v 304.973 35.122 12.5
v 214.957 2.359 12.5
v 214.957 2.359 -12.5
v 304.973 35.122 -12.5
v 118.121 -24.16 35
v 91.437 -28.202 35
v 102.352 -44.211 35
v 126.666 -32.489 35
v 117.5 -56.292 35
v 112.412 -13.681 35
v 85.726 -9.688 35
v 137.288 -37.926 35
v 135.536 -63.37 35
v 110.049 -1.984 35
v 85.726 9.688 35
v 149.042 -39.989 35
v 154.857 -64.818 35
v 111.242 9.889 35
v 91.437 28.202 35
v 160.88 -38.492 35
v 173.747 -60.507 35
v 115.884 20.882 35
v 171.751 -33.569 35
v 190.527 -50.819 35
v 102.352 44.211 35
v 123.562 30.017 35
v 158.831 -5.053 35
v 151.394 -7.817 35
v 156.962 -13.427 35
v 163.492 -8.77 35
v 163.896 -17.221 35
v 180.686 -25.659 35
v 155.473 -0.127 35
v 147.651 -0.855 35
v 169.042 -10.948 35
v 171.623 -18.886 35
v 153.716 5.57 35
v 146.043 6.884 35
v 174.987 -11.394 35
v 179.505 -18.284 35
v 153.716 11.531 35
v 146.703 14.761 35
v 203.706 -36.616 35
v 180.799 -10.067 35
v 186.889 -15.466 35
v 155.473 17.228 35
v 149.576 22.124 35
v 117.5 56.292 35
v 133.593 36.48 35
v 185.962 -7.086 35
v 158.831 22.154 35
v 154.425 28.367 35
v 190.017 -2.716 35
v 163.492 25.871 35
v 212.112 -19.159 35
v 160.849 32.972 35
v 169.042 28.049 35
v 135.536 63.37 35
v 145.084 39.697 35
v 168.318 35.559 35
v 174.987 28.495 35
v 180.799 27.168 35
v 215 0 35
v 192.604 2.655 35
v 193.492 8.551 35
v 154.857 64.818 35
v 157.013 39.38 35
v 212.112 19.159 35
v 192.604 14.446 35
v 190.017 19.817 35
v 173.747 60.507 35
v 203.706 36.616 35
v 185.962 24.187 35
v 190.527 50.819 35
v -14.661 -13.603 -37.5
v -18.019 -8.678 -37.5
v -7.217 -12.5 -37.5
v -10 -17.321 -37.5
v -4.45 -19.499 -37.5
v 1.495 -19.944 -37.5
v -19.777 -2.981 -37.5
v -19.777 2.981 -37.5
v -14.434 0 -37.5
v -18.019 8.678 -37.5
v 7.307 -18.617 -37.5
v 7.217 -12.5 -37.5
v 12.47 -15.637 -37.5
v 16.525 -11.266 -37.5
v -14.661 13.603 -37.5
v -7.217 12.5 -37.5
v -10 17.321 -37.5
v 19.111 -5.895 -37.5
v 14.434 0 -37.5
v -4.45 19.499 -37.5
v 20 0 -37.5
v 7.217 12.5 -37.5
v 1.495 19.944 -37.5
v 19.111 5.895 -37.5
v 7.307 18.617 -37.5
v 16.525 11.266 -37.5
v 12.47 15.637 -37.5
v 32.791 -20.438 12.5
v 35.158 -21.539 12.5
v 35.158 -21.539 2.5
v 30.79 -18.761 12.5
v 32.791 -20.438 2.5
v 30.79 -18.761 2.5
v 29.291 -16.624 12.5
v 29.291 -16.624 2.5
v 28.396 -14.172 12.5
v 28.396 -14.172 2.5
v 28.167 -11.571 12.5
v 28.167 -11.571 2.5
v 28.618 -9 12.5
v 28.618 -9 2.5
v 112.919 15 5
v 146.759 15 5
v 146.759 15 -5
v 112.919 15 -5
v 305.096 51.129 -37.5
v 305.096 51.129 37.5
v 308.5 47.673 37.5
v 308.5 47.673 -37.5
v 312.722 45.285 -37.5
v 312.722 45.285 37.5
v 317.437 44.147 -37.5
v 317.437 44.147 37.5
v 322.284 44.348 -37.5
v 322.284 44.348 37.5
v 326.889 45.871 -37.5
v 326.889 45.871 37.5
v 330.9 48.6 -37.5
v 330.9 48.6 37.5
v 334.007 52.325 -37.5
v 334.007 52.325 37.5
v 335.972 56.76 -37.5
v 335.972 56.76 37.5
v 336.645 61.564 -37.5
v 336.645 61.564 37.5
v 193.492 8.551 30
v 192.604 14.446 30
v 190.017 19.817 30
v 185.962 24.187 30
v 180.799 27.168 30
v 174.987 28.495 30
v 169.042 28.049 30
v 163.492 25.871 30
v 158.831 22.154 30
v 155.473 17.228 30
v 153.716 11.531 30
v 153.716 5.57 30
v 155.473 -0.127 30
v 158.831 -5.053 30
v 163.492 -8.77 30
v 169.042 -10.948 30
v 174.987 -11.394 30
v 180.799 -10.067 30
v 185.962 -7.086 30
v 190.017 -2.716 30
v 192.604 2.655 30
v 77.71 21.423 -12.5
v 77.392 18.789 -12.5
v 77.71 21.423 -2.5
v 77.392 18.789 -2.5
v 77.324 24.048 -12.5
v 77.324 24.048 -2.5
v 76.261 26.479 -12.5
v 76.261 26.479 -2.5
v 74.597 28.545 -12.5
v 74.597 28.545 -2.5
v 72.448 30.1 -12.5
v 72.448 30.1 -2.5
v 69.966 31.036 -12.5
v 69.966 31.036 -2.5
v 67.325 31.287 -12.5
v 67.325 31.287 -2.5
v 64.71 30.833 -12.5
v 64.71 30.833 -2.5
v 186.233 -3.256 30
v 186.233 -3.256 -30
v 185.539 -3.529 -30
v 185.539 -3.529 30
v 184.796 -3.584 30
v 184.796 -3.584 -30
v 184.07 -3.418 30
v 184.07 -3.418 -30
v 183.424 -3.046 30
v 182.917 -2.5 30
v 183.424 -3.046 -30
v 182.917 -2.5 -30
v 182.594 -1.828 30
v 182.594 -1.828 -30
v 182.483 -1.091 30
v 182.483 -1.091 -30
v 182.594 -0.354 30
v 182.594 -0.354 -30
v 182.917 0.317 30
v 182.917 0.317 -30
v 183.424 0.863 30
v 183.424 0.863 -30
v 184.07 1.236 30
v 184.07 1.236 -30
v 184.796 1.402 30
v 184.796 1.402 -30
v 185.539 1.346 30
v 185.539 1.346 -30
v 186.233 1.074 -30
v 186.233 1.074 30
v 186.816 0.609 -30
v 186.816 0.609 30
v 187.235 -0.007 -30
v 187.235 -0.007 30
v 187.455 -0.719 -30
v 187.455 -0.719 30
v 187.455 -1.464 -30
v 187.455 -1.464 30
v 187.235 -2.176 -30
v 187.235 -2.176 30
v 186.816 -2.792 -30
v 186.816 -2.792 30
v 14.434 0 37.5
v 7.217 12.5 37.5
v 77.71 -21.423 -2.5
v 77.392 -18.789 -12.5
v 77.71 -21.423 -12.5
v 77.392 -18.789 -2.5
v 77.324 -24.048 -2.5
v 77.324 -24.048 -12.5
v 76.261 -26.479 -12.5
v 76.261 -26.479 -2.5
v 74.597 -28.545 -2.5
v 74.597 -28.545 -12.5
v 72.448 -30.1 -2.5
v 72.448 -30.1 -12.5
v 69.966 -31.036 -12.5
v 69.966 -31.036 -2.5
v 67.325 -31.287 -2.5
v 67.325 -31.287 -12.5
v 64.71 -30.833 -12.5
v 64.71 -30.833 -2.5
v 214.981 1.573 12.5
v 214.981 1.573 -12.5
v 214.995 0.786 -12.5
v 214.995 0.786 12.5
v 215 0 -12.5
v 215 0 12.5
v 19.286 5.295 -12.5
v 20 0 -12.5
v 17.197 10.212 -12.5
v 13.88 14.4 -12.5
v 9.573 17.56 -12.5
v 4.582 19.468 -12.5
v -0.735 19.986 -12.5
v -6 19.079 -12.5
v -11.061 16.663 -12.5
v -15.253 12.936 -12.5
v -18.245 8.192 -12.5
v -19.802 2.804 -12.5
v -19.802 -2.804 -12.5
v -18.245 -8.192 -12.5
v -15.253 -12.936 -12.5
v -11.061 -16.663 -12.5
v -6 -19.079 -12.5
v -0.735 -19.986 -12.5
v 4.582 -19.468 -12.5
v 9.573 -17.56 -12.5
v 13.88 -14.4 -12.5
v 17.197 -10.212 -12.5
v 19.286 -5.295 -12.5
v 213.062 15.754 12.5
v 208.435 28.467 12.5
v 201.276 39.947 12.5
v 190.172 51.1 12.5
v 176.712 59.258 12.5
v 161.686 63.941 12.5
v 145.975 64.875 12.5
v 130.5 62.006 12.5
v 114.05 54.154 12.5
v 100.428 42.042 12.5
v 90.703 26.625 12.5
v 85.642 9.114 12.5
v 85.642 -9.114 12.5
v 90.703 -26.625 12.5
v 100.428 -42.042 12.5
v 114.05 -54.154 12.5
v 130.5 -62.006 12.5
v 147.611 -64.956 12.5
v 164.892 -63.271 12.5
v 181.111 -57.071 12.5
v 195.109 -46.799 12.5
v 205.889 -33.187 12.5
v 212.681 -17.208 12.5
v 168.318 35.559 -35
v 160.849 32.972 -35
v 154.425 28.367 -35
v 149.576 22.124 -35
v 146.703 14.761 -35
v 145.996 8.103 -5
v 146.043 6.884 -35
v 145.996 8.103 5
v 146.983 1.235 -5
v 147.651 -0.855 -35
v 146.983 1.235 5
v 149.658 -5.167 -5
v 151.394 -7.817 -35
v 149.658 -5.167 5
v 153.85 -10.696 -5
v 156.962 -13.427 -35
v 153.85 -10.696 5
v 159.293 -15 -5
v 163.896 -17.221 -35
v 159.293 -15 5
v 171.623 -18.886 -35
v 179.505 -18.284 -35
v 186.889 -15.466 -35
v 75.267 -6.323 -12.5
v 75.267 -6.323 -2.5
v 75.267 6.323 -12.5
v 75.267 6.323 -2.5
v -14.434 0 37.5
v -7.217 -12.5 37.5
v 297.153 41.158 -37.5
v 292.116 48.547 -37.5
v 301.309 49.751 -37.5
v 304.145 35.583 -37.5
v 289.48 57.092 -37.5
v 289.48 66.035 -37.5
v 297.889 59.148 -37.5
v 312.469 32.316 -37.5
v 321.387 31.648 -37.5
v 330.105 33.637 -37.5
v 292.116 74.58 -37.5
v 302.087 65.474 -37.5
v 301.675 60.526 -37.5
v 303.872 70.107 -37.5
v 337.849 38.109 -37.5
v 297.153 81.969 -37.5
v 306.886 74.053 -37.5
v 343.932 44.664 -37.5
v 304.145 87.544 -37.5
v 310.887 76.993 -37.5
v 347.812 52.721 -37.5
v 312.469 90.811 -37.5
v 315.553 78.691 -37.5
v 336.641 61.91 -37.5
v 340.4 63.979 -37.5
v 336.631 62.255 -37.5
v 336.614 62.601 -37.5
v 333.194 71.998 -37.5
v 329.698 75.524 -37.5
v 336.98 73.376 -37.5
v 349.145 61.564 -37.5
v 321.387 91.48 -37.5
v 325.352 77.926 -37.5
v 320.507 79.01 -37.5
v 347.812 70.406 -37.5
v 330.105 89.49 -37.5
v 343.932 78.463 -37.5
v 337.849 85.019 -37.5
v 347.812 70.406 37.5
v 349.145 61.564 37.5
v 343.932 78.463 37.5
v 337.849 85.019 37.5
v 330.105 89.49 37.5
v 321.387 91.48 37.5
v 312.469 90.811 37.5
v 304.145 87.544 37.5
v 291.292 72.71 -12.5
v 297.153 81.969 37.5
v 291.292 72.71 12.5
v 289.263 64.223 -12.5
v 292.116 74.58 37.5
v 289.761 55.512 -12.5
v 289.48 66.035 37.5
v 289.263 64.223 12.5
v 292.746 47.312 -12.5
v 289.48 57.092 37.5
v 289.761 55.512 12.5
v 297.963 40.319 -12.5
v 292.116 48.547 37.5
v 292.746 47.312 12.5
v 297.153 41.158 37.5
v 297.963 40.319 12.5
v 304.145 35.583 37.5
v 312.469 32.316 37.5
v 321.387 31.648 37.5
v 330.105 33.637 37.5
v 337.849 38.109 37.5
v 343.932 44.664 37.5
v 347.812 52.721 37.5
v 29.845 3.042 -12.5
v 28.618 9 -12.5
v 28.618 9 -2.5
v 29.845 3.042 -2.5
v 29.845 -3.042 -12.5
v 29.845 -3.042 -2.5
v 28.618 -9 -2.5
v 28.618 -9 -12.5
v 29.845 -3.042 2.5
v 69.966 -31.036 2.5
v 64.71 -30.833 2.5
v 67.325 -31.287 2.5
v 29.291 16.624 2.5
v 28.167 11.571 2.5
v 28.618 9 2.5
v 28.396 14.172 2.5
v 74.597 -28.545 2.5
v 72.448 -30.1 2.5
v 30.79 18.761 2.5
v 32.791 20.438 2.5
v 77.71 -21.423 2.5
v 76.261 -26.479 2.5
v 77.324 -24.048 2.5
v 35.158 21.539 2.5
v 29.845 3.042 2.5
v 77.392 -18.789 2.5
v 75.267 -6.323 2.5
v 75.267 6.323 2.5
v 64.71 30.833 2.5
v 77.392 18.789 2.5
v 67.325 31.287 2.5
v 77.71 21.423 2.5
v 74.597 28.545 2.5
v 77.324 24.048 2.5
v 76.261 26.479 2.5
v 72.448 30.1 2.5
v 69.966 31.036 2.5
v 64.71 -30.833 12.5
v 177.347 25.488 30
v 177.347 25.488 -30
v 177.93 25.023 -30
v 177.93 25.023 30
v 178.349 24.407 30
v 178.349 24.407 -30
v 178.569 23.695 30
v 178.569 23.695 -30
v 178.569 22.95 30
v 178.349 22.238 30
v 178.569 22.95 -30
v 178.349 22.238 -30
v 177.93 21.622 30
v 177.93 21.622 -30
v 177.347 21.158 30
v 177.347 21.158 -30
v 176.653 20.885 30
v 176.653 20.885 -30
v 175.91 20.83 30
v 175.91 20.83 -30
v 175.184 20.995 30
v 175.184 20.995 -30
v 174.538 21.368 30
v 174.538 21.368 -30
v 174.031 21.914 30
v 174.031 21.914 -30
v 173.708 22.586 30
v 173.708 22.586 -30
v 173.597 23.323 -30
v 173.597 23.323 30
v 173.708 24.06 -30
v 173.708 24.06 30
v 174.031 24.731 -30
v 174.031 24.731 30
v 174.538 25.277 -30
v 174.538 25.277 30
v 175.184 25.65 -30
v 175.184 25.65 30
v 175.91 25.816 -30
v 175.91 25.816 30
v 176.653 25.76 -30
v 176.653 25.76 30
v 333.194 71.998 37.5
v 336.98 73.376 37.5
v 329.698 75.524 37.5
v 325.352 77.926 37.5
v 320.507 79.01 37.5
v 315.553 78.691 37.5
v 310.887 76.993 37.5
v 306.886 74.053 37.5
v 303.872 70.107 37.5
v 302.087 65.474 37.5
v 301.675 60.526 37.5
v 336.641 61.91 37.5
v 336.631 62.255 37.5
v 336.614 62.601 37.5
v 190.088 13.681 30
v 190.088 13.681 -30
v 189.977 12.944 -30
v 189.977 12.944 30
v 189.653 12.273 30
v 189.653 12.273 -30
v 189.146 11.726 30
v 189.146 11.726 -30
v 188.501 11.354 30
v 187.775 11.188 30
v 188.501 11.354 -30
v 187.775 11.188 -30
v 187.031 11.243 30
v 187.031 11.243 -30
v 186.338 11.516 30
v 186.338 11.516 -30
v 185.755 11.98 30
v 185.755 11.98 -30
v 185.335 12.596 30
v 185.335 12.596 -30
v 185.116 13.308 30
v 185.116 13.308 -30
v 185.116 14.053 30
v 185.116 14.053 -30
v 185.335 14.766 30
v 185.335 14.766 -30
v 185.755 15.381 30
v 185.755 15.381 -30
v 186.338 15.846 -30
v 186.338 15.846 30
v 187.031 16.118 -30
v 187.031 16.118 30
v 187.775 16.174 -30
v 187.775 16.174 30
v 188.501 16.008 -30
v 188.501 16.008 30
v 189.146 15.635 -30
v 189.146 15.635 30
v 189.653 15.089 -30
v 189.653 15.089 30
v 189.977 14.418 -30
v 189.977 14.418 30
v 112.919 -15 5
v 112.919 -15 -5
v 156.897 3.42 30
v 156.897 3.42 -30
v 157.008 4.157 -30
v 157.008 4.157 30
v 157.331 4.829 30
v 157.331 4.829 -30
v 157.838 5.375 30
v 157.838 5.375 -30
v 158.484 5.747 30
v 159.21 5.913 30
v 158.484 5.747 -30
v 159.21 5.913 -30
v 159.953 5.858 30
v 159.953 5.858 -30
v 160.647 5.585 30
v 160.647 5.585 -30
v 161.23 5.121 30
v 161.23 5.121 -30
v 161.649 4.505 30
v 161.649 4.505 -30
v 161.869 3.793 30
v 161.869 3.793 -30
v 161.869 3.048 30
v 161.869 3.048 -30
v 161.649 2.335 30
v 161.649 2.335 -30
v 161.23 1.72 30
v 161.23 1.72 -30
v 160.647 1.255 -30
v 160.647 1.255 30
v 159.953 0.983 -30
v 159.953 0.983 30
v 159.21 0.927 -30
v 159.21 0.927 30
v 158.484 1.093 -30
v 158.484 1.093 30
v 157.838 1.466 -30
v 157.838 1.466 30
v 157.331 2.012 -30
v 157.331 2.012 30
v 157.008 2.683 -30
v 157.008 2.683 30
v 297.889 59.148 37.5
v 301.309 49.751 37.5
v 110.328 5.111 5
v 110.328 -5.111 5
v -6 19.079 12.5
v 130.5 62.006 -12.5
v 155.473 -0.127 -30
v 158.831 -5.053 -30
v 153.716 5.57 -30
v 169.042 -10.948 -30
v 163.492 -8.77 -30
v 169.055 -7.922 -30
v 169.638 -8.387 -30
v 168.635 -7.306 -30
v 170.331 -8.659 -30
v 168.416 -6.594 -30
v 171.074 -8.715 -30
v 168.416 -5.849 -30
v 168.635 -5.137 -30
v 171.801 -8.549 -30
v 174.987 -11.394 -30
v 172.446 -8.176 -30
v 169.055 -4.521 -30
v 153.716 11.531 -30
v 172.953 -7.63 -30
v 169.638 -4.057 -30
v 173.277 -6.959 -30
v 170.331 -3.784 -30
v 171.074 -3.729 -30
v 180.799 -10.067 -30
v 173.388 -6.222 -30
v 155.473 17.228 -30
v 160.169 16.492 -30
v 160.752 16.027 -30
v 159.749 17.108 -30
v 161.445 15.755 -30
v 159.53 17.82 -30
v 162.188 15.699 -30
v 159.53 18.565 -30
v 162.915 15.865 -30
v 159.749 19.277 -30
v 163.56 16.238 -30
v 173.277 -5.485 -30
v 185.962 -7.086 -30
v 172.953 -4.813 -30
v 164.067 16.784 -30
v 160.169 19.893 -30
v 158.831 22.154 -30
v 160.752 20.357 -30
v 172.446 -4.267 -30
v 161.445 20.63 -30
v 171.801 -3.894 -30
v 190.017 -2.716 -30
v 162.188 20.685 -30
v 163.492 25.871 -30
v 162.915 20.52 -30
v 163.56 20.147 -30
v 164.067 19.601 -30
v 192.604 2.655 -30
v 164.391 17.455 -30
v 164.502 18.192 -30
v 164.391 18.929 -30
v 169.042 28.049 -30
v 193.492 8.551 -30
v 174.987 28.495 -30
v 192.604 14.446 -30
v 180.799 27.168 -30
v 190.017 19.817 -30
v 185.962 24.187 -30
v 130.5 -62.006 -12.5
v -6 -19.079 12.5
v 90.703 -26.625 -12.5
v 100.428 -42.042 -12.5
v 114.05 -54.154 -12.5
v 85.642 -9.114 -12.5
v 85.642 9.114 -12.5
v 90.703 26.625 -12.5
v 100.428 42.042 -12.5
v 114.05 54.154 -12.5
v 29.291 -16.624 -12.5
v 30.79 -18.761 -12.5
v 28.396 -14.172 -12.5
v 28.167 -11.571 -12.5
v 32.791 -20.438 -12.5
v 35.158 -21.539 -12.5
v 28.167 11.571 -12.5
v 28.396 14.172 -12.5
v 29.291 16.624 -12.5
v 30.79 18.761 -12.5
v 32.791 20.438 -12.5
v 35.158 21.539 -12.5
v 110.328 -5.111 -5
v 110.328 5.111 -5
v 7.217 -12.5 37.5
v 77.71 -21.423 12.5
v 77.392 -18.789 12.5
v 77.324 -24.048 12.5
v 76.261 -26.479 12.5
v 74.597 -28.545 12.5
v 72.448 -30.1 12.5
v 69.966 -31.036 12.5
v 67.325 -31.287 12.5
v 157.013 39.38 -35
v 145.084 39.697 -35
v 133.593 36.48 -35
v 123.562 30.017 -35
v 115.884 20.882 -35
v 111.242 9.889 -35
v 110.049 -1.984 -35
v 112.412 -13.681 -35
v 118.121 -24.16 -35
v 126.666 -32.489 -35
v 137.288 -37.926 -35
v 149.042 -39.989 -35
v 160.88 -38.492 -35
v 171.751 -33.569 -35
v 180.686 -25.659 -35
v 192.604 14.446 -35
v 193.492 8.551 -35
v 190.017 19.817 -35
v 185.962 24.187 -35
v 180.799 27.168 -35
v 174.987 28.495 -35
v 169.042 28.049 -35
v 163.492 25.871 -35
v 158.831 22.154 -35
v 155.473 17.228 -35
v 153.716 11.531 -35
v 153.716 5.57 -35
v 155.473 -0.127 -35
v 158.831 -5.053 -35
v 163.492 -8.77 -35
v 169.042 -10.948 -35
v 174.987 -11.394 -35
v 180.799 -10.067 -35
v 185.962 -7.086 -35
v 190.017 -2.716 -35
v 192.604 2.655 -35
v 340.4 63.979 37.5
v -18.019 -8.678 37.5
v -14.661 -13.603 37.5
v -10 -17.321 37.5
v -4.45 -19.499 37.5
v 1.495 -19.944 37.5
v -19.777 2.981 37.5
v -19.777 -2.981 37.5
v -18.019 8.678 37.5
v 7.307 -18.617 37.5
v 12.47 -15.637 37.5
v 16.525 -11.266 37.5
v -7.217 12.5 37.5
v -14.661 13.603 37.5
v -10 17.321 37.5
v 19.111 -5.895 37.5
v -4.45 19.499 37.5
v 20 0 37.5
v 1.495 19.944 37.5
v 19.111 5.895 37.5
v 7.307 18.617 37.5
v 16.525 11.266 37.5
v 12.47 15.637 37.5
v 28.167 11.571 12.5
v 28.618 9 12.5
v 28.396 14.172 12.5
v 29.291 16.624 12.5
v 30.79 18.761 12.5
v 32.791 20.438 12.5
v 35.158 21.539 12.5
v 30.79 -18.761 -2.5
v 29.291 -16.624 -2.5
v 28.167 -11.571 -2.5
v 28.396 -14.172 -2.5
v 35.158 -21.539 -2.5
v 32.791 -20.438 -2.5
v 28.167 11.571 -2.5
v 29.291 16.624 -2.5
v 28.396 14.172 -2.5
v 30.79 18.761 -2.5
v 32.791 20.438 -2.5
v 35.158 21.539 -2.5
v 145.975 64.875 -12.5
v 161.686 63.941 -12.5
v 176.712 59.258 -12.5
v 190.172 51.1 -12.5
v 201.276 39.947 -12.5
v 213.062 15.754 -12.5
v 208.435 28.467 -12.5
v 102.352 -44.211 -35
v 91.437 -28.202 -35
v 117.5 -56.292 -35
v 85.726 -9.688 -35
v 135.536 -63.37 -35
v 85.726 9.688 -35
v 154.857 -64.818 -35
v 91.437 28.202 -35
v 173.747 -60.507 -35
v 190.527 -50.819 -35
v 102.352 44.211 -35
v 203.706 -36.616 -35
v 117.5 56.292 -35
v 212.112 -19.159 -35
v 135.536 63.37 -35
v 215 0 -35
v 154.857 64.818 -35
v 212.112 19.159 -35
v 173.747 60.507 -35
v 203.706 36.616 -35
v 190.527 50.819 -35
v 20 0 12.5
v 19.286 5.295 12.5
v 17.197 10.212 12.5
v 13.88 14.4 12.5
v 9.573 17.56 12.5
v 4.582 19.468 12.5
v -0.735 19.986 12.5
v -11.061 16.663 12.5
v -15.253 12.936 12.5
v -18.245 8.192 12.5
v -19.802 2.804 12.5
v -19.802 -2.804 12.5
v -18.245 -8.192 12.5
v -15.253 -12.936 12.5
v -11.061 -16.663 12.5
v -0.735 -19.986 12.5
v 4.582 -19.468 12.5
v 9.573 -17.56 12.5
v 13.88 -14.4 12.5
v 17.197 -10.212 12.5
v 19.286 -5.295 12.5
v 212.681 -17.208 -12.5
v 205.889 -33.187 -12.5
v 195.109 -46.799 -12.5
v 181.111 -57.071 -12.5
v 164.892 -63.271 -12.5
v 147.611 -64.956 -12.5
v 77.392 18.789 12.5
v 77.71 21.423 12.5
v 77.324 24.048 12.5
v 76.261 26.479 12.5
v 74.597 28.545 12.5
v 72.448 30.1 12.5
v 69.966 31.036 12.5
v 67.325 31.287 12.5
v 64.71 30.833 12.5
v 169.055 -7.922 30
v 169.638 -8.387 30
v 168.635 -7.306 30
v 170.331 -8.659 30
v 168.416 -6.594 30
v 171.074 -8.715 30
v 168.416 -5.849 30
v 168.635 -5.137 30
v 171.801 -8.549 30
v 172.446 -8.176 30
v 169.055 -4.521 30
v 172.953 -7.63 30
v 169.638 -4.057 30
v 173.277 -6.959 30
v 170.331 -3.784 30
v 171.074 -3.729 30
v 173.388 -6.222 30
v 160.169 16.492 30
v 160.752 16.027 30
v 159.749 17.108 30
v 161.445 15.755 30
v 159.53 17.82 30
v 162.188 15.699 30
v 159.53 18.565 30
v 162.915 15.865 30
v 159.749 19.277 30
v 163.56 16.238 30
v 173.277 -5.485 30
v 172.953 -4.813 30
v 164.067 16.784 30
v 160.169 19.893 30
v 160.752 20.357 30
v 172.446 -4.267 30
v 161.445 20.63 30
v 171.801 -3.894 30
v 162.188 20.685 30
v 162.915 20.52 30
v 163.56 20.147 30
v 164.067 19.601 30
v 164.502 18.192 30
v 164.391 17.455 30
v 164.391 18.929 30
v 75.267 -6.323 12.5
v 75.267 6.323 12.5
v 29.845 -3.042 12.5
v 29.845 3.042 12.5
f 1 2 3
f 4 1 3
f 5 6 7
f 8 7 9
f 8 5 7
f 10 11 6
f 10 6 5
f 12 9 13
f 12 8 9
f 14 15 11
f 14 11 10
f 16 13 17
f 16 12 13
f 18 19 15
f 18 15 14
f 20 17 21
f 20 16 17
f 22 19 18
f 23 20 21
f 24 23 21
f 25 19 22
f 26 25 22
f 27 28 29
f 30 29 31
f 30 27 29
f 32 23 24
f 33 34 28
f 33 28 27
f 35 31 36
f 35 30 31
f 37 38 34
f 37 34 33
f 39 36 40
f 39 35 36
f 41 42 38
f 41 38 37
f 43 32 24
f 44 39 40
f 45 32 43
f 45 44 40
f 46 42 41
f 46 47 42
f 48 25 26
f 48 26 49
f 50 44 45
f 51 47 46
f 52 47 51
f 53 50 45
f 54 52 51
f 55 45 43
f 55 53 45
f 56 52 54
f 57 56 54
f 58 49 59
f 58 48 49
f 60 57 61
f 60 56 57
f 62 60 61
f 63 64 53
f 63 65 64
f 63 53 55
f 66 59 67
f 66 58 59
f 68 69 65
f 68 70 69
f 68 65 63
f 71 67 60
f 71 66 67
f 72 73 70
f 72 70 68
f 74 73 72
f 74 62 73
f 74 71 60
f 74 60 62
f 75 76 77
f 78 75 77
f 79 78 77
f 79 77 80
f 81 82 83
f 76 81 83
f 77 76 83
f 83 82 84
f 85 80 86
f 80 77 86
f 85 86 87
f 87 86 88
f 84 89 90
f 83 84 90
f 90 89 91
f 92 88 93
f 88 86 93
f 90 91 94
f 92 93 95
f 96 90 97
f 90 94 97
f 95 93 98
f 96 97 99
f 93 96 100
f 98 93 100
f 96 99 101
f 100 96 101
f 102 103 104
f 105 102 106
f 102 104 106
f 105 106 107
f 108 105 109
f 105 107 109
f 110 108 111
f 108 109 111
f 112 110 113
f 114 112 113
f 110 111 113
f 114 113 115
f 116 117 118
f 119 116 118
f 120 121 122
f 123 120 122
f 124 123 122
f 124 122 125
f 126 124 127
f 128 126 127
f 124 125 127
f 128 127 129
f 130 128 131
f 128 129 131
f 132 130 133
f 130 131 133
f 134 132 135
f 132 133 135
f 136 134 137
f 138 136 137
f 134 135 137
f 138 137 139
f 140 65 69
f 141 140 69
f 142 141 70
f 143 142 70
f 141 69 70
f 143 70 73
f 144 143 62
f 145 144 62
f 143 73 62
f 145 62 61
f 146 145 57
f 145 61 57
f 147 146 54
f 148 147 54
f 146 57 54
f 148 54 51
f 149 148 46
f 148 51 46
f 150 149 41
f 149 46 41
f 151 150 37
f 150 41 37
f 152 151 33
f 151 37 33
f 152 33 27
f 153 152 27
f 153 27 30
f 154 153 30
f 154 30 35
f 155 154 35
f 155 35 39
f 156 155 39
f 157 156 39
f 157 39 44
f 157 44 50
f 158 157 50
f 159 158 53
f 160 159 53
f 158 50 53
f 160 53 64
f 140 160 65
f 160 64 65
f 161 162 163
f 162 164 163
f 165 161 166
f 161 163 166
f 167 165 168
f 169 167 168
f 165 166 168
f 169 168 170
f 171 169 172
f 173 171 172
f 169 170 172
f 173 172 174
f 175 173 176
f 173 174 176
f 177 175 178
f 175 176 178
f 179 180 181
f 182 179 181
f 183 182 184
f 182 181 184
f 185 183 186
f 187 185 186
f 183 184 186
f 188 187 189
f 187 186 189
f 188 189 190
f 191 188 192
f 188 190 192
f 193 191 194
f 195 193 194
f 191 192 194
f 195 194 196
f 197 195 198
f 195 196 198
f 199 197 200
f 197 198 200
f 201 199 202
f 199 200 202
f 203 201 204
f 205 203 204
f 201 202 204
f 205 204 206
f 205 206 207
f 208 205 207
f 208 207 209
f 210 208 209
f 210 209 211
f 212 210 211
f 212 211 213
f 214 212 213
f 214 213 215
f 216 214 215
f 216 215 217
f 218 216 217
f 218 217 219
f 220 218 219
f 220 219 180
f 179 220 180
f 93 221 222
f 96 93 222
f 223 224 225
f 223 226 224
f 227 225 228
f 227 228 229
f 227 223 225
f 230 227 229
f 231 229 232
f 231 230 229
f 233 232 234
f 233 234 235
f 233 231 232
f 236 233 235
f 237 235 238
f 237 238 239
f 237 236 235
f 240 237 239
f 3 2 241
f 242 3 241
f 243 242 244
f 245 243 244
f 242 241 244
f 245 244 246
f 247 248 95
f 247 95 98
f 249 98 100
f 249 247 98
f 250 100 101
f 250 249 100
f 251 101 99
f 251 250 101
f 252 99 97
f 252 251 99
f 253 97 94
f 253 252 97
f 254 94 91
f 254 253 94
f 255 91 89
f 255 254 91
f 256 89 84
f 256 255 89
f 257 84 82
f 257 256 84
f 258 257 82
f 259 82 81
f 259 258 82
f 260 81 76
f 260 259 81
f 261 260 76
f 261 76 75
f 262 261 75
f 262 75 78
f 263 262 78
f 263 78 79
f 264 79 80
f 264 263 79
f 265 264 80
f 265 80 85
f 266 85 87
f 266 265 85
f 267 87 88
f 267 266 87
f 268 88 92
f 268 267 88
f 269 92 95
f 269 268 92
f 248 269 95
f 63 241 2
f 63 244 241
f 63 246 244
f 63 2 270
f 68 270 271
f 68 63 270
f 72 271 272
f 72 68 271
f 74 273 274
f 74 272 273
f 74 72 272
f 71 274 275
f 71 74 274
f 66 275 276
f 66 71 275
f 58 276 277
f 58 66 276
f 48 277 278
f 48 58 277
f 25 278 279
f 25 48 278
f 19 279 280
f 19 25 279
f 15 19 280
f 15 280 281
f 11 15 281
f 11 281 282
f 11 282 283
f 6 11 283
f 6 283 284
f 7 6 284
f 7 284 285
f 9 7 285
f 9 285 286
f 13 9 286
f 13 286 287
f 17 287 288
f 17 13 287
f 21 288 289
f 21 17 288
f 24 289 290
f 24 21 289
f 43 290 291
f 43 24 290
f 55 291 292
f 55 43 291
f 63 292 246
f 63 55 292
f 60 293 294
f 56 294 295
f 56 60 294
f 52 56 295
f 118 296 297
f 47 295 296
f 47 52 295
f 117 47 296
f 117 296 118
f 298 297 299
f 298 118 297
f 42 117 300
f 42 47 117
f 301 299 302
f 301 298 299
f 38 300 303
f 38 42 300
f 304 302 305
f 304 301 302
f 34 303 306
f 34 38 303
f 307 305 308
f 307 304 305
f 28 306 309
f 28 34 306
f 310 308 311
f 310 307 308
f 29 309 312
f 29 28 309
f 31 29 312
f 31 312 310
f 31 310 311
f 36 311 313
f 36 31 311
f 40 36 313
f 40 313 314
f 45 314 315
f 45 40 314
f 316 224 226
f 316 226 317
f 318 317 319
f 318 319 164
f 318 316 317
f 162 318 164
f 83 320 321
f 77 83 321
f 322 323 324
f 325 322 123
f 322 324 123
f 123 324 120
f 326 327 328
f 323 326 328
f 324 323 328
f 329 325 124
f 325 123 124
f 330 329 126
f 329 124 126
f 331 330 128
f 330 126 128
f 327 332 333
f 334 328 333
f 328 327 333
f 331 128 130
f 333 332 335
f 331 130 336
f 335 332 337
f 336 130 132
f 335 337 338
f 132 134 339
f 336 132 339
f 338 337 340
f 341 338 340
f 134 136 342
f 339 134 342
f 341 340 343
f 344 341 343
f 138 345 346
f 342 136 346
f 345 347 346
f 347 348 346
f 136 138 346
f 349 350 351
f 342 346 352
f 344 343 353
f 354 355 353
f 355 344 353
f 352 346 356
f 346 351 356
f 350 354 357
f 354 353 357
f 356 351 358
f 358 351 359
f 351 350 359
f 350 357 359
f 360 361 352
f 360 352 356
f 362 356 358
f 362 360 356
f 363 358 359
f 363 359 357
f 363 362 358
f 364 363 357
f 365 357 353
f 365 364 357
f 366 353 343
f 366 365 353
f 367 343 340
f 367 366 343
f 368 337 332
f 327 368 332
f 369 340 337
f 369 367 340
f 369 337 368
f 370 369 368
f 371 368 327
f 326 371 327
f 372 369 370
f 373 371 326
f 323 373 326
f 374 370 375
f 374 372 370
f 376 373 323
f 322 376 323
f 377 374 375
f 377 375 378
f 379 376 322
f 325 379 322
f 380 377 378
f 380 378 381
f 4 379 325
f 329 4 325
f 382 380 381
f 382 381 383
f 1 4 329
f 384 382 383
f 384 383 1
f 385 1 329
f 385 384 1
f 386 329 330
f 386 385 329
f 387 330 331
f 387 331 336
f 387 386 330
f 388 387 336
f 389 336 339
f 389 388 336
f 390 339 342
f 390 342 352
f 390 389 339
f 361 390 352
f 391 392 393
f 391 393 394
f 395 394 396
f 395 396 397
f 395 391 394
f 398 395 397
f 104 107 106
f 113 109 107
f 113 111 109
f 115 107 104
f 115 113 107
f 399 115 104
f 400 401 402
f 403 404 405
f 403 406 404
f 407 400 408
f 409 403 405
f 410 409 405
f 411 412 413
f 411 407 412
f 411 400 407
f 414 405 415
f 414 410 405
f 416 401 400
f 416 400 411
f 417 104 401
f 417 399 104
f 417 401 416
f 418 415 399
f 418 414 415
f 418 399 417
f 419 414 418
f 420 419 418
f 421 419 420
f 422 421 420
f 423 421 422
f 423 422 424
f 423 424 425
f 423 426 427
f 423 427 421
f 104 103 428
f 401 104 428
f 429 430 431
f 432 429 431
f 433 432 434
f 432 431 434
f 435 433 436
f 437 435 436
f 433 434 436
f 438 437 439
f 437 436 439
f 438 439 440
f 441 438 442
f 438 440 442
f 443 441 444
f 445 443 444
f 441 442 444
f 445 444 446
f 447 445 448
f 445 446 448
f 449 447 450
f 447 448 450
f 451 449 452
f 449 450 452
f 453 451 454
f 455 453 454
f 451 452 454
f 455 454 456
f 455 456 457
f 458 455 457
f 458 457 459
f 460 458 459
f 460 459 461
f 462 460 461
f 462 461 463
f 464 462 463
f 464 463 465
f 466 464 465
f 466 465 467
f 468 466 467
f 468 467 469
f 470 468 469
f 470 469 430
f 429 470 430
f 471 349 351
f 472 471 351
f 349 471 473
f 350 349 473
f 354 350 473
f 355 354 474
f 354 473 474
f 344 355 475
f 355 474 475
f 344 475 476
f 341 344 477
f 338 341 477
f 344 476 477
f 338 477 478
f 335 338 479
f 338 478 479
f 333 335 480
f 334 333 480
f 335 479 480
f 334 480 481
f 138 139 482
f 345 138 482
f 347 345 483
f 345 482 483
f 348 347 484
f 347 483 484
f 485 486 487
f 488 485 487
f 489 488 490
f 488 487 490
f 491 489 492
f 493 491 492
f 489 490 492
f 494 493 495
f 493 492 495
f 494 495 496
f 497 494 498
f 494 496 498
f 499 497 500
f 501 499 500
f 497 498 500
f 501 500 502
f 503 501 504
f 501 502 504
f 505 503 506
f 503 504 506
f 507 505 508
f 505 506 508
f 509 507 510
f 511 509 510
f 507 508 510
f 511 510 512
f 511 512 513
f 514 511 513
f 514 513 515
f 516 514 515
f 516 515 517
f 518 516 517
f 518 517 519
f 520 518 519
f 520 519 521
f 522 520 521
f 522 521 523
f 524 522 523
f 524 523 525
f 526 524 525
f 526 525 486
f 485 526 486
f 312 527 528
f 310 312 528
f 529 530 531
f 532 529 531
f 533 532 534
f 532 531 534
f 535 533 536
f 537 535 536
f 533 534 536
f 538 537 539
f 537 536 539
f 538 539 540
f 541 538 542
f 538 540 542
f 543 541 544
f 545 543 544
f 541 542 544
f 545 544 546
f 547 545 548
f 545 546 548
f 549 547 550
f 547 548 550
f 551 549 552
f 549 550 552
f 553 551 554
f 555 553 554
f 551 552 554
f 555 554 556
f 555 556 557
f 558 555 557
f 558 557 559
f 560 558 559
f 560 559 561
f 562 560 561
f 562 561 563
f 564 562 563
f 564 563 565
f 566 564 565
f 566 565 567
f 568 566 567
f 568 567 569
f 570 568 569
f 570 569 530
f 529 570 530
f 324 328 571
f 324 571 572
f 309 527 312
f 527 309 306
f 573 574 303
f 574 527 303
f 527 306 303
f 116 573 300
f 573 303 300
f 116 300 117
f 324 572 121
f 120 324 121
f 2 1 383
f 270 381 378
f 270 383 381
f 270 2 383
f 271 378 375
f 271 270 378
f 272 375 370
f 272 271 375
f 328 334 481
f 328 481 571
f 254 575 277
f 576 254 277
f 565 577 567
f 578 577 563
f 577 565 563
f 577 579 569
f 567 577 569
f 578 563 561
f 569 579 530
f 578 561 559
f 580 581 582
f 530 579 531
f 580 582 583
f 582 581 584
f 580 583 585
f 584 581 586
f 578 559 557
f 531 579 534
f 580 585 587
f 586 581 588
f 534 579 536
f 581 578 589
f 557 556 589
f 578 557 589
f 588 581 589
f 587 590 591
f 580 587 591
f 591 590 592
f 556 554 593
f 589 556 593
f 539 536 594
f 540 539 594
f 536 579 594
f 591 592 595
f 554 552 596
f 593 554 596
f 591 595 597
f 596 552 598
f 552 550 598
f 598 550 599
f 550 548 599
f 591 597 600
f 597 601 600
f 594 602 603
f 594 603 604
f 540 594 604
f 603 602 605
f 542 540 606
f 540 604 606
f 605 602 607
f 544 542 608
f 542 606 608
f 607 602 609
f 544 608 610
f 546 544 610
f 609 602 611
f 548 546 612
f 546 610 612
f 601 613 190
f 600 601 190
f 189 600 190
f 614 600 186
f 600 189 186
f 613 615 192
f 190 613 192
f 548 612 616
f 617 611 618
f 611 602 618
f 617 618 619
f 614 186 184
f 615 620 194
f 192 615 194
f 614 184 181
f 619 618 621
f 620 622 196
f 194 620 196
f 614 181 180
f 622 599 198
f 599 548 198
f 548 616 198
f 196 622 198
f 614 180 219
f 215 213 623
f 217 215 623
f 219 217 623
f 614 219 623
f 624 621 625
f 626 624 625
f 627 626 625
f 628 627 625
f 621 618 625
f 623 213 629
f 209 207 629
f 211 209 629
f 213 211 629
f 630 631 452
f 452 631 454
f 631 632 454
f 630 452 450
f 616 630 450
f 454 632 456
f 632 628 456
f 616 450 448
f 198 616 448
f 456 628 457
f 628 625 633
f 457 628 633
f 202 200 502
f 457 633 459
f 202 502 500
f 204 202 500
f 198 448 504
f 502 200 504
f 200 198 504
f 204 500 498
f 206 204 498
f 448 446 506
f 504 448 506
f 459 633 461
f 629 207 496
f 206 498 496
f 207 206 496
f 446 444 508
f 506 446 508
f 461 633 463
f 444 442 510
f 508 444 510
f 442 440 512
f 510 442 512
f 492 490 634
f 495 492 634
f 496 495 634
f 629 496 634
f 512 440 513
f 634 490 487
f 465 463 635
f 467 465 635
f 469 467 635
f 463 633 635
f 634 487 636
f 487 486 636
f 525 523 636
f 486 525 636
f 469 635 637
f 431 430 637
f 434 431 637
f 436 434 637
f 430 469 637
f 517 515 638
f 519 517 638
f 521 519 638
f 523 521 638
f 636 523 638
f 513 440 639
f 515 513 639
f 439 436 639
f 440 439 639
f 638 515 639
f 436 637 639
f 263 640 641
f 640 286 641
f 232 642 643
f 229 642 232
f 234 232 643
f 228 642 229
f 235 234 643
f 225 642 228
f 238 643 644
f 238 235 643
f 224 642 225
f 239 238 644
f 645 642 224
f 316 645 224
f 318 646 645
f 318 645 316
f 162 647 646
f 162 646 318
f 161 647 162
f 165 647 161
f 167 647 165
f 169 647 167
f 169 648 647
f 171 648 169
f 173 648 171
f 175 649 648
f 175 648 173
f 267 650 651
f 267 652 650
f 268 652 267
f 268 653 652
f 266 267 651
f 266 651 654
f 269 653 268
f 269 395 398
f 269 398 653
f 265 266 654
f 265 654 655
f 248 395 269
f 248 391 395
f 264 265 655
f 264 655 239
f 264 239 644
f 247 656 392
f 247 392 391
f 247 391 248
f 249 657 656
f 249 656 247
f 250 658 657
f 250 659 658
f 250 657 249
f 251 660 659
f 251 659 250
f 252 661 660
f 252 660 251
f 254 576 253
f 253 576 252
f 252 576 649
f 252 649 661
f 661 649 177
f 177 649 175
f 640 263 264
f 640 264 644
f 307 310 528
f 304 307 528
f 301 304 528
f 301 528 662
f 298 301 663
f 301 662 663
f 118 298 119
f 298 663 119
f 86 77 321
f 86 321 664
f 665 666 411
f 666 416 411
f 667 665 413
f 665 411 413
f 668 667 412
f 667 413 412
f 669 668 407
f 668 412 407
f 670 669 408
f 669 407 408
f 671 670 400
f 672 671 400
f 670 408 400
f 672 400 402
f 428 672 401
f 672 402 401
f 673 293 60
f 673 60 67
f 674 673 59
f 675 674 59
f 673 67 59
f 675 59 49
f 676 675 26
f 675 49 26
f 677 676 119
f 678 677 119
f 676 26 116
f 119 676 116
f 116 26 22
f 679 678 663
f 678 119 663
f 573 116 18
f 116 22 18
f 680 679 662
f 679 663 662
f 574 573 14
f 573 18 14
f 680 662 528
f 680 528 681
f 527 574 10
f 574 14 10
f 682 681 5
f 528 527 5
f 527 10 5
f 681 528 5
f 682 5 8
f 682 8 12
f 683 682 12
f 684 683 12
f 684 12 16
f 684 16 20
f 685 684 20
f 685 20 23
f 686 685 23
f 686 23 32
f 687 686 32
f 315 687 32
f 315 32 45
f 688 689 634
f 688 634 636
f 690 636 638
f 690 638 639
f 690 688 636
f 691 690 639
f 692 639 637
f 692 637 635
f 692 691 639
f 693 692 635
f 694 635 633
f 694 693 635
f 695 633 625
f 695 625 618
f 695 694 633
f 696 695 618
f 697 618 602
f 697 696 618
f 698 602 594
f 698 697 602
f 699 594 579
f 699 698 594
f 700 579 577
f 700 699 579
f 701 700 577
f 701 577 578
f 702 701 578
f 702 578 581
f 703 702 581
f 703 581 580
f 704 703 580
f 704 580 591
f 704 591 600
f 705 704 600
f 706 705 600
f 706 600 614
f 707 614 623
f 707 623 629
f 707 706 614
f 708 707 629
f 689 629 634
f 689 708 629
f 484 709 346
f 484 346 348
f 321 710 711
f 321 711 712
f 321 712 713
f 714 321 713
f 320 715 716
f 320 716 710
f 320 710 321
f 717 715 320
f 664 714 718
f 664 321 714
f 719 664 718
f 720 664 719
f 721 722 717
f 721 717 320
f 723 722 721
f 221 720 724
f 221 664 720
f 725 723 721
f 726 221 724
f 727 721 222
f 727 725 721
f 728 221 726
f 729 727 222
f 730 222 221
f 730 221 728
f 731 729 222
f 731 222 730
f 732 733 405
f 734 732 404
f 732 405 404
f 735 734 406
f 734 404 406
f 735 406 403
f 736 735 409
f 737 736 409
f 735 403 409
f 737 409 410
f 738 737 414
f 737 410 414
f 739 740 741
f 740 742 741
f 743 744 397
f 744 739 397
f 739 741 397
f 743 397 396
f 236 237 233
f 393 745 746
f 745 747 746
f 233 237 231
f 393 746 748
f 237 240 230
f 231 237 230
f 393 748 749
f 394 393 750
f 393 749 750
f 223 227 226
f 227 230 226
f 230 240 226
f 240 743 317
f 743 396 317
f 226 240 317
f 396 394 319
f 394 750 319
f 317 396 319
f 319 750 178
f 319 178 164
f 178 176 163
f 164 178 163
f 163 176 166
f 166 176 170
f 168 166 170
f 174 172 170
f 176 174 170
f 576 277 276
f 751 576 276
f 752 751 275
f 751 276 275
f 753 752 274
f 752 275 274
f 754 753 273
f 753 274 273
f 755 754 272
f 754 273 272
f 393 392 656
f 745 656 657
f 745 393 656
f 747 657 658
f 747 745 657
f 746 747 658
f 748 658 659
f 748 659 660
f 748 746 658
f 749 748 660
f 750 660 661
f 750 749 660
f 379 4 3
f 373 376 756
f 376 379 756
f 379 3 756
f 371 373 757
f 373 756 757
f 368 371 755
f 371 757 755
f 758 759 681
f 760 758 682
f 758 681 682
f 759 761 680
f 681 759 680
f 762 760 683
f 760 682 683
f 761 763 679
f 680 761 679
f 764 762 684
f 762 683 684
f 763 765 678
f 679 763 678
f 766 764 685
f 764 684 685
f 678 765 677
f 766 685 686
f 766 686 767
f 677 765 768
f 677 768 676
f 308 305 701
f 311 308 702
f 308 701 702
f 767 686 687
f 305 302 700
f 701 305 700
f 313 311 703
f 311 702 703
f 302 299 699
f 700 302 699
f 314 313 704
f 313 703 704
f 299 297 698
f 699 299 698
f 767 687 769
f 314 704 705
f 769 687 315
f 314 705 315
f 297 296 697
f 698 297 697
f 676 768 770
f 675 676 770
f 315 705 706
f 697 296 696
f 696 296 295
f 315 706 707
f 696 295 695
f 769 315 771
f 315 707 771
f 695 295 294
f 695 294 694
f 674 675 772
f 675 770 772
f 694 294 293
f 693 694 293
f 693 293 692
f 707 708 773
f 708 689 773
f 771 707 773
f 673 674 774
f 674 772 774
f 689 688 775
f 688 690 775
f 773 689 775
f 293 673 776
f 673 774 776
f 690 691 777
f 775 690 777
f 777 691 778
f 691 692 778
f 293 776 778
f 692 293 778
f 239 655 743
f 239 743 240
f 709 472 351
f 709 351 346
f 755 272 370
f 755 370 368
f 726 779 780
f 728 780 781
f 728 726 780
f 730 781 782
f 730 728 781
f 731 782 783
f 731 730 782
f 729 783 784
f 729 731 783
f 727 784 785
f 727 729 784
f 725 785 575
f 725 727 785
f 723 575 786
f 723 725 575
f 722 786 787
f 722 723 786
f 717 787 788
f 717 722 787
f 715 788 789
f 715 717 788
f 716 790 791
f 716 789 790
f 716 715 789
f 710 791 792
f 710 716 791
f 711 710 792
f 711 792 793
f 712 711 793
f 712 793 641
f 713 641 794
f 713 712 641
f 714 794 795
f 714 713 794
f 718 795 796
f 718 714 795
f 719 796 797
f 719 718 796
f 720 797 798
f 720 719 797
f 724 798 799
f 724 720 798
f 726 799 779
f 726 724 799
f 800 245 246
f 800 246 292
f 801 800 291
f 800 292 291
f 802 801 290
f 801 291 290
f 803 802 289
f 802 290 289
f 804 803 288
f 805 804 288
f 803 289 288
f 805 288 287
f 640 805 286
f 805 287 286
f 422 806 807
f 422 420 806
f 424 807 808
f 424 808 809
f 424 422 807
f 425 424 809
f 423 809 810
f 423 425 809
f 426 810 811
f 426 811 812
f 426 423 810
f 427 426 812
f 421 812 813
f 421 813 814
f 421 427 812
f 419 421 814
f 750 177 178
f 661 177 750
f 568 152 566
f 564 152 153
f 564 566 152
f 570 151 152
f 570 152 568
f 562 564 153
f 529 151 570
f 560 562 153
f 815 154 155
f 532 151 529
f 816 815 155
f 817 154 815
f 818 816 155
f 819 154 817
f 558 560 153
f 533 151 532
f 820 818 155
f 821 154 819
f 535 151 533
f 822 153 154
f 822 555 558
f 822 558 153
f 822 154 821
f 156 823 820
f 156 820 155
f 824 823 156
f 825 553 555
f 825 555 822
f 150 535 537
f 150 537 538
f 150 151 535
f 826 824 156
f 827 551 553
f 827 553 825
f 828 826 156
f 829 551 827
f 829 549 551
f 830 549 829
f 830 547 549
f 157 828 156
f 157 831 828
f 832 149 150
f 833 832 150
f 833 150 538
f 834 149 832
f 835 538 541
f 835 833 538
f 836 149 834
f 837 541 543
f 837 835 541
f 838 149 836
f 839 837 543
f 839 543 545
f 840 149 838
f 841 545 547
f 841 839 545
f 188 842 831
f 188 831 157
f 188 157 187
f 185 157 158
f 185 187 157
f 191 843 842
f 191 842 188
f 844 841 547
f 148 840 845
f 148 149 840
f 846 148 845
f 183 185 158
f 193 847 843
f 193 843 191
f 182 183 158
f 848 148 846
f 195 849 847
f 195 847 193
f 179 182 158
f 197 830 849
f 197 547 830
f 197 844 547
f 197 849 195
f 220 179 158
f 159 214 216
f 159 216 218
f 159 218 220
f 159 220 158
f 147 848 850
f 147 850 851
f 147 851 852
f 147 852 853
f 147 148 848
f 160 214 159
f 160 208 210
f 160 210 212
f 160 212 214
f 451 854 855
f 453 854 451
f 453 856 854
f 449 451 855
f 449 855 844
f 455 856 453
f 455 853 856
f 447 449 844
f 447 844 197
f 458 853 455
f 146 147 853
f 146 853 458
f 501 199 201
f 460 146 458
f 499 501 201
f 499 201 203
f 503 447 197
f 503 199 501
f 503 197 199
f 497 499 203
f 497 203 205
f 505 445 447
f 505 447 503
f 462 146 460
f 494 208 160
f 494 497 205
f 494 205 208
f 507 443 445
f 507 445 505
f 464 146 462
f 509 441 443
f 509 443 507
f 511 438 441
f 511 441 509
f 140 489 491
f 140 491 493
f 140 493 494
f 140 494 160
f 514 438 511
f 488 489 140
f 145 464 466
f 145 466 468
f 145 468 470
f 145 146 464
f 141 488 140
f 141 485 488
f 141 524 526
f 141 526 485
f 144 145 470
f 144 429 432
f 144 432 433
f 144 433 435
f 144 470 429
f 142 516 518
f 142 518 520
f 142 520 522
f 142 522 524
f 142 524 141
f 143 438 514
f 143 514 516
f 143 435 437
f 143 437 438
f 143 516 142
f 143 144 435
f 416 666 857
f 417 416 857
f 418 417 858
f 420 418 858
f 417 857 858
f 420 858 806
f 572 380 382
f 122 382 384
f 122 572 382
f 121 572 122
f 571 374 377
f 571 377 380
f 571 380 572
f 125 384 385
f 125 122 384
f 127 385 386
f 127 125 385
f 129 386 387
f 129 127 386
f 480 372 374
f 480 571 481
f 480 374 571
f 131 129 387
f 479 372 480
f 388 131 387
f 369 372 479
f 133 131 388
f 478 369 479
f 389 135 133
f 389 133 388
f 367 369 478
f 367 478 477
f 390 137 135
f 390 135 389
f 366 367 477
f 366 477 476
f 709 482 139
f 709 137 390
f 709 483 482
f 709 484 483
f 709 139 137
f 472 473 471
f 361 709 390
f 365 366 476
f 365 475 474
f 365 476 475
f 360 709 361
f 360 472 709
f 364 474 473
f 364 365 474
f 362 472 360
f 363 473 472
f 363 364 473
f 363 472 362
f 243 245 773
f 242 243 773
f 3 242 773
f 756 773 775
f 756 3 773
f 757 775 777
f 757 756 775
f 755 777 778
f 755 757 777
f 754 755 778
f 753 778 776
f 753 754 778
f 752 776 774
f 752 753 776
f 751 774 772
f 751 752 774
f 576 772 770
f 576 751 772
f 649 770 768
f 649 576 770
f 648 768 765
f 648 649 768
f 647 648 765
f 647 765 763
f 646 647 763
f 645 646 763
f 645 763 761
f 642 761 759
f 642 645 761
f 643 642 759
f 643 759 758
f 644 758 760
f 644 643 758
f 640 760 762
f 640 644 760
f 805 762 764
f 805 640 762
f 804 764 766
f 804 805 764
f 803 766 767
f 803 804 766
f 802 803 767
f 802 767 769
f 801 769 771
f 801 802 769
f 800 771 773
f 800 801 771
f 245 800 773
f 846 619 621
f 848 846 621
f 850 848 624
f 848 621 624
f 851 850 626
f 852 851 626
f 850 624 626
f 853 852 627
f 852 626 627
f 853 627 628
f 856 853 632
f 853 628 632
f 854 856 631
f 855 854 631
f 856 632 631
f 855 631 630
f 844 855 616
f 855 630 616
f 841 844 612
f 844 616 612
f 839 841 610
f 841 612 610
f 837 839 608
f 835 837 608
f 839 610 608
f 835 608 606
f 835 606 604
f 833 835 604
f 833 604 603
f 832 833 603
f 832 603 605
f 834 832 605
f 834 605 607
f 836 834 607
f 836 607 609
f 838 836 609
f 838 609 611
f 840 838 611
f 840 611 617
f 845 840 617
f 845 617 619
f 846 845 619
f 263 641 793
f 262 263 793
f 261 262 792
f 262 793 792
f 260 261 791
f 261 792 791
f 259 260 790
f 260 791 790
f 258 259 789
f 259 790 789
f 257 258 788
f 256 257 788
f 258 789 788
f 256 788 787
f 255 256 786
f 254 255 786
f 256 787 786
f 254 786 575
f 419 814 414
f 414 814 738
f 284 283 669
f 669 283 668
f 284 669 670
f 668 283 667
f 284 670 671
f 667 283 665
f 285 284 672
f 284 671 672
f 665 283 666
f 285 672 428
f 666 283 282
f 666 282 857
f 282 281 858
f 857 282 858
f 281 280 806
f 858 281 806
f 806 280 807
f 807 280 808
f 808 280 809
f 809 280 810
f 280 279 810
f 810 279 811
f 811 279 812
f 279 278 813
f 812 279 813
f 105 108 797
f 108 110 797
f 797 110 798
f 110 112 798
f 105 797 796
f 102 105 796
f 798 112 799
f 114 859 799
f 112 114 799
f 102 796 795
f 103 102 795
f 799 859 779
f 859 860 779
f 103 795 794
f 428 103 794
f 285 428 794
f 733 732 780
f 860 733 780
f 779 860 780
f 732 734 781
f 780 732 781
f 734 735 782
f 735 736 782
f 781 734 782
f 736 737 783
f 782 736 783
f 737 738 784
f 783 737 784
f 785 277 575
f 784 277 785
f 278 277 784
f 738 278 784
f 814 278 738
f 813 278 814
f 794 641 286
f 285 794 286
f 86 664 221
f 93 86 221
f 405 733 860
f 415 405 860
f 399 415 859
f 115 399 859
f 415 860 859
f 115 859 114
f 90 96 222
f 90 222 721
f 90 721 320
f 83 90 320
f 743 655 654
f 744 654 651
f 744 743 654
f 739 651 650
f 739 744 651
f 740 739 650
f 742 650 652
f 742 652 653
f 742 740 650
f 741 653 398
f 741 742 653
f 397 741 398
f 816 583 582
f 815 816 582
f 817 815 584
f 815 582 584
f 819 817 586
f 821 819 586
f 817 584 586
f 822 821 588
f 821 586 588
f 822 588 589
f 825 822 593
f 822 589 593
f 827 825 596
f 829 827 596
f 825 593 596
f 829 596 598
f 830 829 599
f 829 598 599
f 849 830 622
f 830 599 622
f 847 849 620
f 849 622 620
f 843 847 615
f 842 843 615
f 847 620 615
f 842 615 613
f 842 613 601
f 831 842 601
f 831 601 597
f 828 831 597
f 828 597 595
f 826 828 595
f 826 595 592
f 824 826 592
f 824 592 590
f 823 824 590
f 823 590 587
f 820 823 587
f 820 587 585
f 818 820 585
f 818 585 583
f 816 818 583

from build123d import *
from build123d.topology import SkipClean

# Parameters (mm, degrees)
LEFT_ARM_DEPTH                = 12.5
SKETCH2_R                     = 20
LEFT_BOSS_DEPTH               = 37.5
LEFT_HEX_DEPTH                = 237.801604724
LEFT_HEX_DEPTH_BACK           = 237.801604724
SKETCH3_R                     = 65
CENTRE_BOSS_DEPTH             = 35
SKETCH5_W                     = 25
SKETCH5_H                     = 40
RIGHT_ARM_DEPTH               = 180
SKETCH7_R                     = 30
RIGHT_BOSS_DEPTH              = 37.5
SKETCH8_R                     = 17.5
RIGHT_BOSS_HOLE_DEPTH         = 369.660954503
SKETCH9_R                     = 40
CENTRE_HOLE_DEPTH             = 369.160494044
SKETCH10_R                    = 27.5
CENTRE_BLOB_DEPTH             = 35
CENTRE_BEAM_REACH             = 224.371
SKETCH11_W                    = 10
SKETCH11_H                    = 30
CENTRE_BEAM_DIRECTION_2_REACH = 224.371
SKETCH12_R                    = 20
CUT_EXTRUDE4_DEPTH            = 5
M6X1_0_TAPPED_HOLE1_D         = 5
CIRPATTERN1_COUNT             = 6
CUT_OUT_DEPTH                 = 10
FILLET1_R                     = 10
FILLET1_OF_MIRROR2_R          = 10
KEYWAY_DEPTH                  = 363.894129706


with BuildPart() as part:
    # Sketch1 → LEFT_ARM (new, symmetric)
    with BuildSketch(Plane.XY):
        with BuildLine():
            Line((-6, 19.078784028), (130.5, 62.006048092))
            ThreePointArc((130.5, 62.006048092), (215, 0), (130.5, -62.006048092))
            Line((130.5, -62.006048092), (-6, -19.078784028))
            ThreePointArc((-6, -19.078784028), (-20, 0), (-6, 19.078784028))
        make_face()
    extrude(amount=LEFT_ARM_DEPTH, both=True)

    # Sketch2 → LEFT_Boss (add, symmetric)
    with SkipClean():  # the faces are left unmerged after this step: merging them gives an invalid solid
        with BuildSketch(Plane.XY):
            Circle(SKETCH2_R)
        extrude(amount=LEFT_BOSS_DEPTH, both=True)

    # Sketch4 → LEFT_Hex (cut, two sides: drawn at the far end of the back side and taken through both)
    with SkipClean():  # the faces are left unmerged after this step: merging them gives an invalid solid
        with BuildSketch(Plane.XY.offset(37.5).offset(-LEFT_HEX_DEPTH_BACK)):
            Polygon((14.43375673, 0), (7.216878365, 12.5), (-7.216878365, 12.5), (-14.43375673, 0), (-7.216878365, -12.5), (7.216878365, -12.5), align=None)
        extrude(amount=LEFT_HEX_DEPTH + LEFT_HEX_DEPTH_BACK, mode=Mode.SUBTRACT)

    # Sketch3 → CENTRE_Boss (add, symmetric)
    with SkipClean():  # the faces are left unmerged after this step: merging them gives an invalid solid
        with BuildSketch(Plane.XY):
            with Locations((150, 0)):
                Circle(SKETCH3_R)
        extrude(amount=CENTRE_BOSS_DEPTH, both=True)

    # Sketch5 → RIGHT_ARM (add)
    with SkipClean():  # the faces are left unmerged after this step: merging them gives an invalid solid
        with BuildSketch(Plane(origin=(132.453333234, 48.209070726, 0), x_dir=(0, 0, -1), z_dir=(0.9396926207859081, 0.34202014332566943, 0))):
            with Locations((0, -51.303021499)):
                Rectangle(SKETCH5_W, SKETCH5_H)
        extrude(amount=RIGHT_ARM_DEPTH)

    # Sketch7 → RIGHT_Boss (add, symmetric)
    with SkipClean():  # the faces are left unmerged after this step: merging them gives an invalid solid
        with BuildSketch(Plane.XY):
            with Locations((319.144671741, 61.563625799)):
                Circle(SKETCH7_R)
        extrude(amount=RIGHT_BOSS_DEPTH, both=True)
    add(part.part.scale(1), mode=Mode.REPLACE)  # the faces are merged on a copy

    # Sketch8 → RIGHT_Boss_Hole (cut, through all)
    with BuildSketch(Plane.XY.offset(37.5)):
        with Locations((319.144671741, 61.563625799)):
            Circle(SKETCH8_R)
    extrude(amount=-RIGHT_BOSS_HOLE_DEPTH, mode=Mode.SUBTRACT)

    # Sketch9 → CENTRE_Hole (cut, through all)
    with BuildSketch(Plane.XY.offset(35)):
        with Locations((150, 0)):
            Circle(SKETCH9_R)
    extrude(amount=-CENTRE_HOLE_DEPTH, mode=Mode.SUBTRACT)

    # Sketch10 → CENTRE_Blob (add, symmetric)
    with SkipClean():  # the faces are left unmerged after this step: merging them gives an invalid solid
        with BuildSketch(Plane.XY):
            with Locations((173.49231552, 8.550503583)):
                Circle(SKETCH10_R)
        extrude(amount=CENTRE_BLOB_DEPTH, both=True)

    # Sketch11 → CENTRE_Beam (add, up to next)
    with BuildSketch(Plane(origin=(150, 0, 0), x_dir=(0, 0, -1), z_dir=(1, 0, 0)), mode=Mode.PRIVATE) as centre_beam_sk1:
        Rectangle(SKETCH11_W, SKETCH11_H)
    centre_beam_tool1 = extrude(centre_beam_sk1.sketch, amount=CENTRE_BEAM_REACH, mode=Mode.PRIVATE) - part.part
    add(centre_beam_tool1.solids().sort_by_distance((150, 0, 0))[0])

    # Sketch11 → CENTRE_Beam direction 2 (add, up to next)
    with BuildSketch(Plane(origin=(150, 0, 0), x_dir=(0, 0, -1), z_dir=(1, 0, 0)), mode=Mode.PRIVATE) as centre_beam_direction_2_sk1:
        Rectangle(SKETCH11_W, SKETCH11_H)
    centre_beam_direction_2_tool1 = extrude(centre_beam_direction_2_sk1.sketch, amount=-CENTRE_BEAM_DIRECTION_2_REACH, mode=Mode.PRIVATE) - part.part
    add(centre_beam_direction_2_tool1.solids().sort_by_distance((150, 0, 0))[0])

    # Sketch12 → Cut-Extrude4 (cut)
    with BuildSketch(Plane.XY.offset(35)):
        with Locations((173.49231552, 8.550503583)):
            Circle(SKETCH12_R)
    cut_extrude4 = extrude(amount=-CUT_EXTRUDE4_DEPTH, mode=Mode.SUBTRACT)

    # M6x1.0 Tapped Hole1 (through all)
    with Locations(Plane.XY.offset(30)):
        with Locations((159.396926208, 3.420201433)):
            m6x1_0_tapped_hole1 = Hole(M6X1_0_TAPPED_HOLE1_D / 2)

    # CirPattern1: M6x1.0 Tapped Hole1 ×6 about axis
    cirpattern1_axis = Axis((173.49231552, 8.550503583, 0), (0, 0, 1))
    for i in range(1, CIRPATTERN1_COUNT):
        add(m6x1_0_tapped_hole1.rotate(cirpattern1_axis, i * 360 / CIRPATTERN1_COUNT), mode=Mode.SUBTRACT)

    # Mirror1: Cut-Extrude4 across plane
    add(cut_extrude4.mirror(Plane.XY), mode=Mode.SUBTRACT)

    # Sketch15 → Cut_OUT (cut)
    with BuildSketch(Plane.XY.offset(12.5)):
        with BuildLine():
            Line((84.858453972, 37.169597537), (23.981475126, 18.024673388))
            ThreePointArc((23.981475126, 18.024673388), (30, 0), (23.981475126, -18.024673388))
            Line((23.981475126, -18.024673388), (84.858453972, -37.169597537))
            ThreePointArc((84.858453972, -37.169597537), (75, 0), (84.858453972, 37.169597537))
        make_face()
    cut_out = extrude(amount=-CUT_OUT_DEPTH, mode=Mode.SUBTRACT)

    # Fillet1
    fillet1_edges = [part.edges().sort_by_distance(p)[0] for p in [
        (23.981475126, -18.024673388, 7.5),
        (23.981475126, 18.024673388, 7.5),
        (84.858453972, 37.169597537, 7.5),
        (84.858453972, -37.169597537, 7.5),
    ]]
    fillet(fillet1_edges, radius=FILLET1_R)

    # Mirror2: Cut_OUT across plane
    with SkipClean():  # the faces are left unmerged after this step: merging them gives an invalid solid
        add(cut_out.mirror(Plane.XY), mode=Mode.SUBTRACT)

    # Fillet1 of Mirror2
    fillet1_of_mirror2_edges = [part.edges().sort_by_distance(p)[0] for p in [
        (23.981475126, -18.024673388, -7.5),
        (23.981475126, 18.024673388, -7.5),
        (84.858453972, 37.169597537, -7.5),
        (84.858453972, -37.169597537, -7.5),
    ]]
    fillet(fillet1_of_mirror2_edges, radius=FILLET1_OF_MIRROR2_R)

    # Sketch16 → KEYWAY (cut, symmetric)
    with SkipClean():  # the faces are left unmerged after this step: merging them gives an invalid solid
        with BuildSketch(Plane.XY):
            Polygon((320.854772458, 56.865162695), (317.434571025, 66.262088903), (297.888964512, 59.148069921), (301.309165946, 49.751143714), align=None)
        keyway = extrude(amount=KEYWAY_DEPTH, both=True, mode=Mode.SUBTRACT)

    # Mirror3: KEYWAY across plane
    with SkipClean():  # the faces are left unmerged after this step: merging them gives an invalid solid
        add(keyway.mirror(Plane(origin=(301.598004975, 109.772696525, 0), x_dir=(0, 0, 1), z_dir=(0.9396926207859081, 0.34202014332566943, 0))), mode=Mode.SUBTRACT)


solid = part.part
